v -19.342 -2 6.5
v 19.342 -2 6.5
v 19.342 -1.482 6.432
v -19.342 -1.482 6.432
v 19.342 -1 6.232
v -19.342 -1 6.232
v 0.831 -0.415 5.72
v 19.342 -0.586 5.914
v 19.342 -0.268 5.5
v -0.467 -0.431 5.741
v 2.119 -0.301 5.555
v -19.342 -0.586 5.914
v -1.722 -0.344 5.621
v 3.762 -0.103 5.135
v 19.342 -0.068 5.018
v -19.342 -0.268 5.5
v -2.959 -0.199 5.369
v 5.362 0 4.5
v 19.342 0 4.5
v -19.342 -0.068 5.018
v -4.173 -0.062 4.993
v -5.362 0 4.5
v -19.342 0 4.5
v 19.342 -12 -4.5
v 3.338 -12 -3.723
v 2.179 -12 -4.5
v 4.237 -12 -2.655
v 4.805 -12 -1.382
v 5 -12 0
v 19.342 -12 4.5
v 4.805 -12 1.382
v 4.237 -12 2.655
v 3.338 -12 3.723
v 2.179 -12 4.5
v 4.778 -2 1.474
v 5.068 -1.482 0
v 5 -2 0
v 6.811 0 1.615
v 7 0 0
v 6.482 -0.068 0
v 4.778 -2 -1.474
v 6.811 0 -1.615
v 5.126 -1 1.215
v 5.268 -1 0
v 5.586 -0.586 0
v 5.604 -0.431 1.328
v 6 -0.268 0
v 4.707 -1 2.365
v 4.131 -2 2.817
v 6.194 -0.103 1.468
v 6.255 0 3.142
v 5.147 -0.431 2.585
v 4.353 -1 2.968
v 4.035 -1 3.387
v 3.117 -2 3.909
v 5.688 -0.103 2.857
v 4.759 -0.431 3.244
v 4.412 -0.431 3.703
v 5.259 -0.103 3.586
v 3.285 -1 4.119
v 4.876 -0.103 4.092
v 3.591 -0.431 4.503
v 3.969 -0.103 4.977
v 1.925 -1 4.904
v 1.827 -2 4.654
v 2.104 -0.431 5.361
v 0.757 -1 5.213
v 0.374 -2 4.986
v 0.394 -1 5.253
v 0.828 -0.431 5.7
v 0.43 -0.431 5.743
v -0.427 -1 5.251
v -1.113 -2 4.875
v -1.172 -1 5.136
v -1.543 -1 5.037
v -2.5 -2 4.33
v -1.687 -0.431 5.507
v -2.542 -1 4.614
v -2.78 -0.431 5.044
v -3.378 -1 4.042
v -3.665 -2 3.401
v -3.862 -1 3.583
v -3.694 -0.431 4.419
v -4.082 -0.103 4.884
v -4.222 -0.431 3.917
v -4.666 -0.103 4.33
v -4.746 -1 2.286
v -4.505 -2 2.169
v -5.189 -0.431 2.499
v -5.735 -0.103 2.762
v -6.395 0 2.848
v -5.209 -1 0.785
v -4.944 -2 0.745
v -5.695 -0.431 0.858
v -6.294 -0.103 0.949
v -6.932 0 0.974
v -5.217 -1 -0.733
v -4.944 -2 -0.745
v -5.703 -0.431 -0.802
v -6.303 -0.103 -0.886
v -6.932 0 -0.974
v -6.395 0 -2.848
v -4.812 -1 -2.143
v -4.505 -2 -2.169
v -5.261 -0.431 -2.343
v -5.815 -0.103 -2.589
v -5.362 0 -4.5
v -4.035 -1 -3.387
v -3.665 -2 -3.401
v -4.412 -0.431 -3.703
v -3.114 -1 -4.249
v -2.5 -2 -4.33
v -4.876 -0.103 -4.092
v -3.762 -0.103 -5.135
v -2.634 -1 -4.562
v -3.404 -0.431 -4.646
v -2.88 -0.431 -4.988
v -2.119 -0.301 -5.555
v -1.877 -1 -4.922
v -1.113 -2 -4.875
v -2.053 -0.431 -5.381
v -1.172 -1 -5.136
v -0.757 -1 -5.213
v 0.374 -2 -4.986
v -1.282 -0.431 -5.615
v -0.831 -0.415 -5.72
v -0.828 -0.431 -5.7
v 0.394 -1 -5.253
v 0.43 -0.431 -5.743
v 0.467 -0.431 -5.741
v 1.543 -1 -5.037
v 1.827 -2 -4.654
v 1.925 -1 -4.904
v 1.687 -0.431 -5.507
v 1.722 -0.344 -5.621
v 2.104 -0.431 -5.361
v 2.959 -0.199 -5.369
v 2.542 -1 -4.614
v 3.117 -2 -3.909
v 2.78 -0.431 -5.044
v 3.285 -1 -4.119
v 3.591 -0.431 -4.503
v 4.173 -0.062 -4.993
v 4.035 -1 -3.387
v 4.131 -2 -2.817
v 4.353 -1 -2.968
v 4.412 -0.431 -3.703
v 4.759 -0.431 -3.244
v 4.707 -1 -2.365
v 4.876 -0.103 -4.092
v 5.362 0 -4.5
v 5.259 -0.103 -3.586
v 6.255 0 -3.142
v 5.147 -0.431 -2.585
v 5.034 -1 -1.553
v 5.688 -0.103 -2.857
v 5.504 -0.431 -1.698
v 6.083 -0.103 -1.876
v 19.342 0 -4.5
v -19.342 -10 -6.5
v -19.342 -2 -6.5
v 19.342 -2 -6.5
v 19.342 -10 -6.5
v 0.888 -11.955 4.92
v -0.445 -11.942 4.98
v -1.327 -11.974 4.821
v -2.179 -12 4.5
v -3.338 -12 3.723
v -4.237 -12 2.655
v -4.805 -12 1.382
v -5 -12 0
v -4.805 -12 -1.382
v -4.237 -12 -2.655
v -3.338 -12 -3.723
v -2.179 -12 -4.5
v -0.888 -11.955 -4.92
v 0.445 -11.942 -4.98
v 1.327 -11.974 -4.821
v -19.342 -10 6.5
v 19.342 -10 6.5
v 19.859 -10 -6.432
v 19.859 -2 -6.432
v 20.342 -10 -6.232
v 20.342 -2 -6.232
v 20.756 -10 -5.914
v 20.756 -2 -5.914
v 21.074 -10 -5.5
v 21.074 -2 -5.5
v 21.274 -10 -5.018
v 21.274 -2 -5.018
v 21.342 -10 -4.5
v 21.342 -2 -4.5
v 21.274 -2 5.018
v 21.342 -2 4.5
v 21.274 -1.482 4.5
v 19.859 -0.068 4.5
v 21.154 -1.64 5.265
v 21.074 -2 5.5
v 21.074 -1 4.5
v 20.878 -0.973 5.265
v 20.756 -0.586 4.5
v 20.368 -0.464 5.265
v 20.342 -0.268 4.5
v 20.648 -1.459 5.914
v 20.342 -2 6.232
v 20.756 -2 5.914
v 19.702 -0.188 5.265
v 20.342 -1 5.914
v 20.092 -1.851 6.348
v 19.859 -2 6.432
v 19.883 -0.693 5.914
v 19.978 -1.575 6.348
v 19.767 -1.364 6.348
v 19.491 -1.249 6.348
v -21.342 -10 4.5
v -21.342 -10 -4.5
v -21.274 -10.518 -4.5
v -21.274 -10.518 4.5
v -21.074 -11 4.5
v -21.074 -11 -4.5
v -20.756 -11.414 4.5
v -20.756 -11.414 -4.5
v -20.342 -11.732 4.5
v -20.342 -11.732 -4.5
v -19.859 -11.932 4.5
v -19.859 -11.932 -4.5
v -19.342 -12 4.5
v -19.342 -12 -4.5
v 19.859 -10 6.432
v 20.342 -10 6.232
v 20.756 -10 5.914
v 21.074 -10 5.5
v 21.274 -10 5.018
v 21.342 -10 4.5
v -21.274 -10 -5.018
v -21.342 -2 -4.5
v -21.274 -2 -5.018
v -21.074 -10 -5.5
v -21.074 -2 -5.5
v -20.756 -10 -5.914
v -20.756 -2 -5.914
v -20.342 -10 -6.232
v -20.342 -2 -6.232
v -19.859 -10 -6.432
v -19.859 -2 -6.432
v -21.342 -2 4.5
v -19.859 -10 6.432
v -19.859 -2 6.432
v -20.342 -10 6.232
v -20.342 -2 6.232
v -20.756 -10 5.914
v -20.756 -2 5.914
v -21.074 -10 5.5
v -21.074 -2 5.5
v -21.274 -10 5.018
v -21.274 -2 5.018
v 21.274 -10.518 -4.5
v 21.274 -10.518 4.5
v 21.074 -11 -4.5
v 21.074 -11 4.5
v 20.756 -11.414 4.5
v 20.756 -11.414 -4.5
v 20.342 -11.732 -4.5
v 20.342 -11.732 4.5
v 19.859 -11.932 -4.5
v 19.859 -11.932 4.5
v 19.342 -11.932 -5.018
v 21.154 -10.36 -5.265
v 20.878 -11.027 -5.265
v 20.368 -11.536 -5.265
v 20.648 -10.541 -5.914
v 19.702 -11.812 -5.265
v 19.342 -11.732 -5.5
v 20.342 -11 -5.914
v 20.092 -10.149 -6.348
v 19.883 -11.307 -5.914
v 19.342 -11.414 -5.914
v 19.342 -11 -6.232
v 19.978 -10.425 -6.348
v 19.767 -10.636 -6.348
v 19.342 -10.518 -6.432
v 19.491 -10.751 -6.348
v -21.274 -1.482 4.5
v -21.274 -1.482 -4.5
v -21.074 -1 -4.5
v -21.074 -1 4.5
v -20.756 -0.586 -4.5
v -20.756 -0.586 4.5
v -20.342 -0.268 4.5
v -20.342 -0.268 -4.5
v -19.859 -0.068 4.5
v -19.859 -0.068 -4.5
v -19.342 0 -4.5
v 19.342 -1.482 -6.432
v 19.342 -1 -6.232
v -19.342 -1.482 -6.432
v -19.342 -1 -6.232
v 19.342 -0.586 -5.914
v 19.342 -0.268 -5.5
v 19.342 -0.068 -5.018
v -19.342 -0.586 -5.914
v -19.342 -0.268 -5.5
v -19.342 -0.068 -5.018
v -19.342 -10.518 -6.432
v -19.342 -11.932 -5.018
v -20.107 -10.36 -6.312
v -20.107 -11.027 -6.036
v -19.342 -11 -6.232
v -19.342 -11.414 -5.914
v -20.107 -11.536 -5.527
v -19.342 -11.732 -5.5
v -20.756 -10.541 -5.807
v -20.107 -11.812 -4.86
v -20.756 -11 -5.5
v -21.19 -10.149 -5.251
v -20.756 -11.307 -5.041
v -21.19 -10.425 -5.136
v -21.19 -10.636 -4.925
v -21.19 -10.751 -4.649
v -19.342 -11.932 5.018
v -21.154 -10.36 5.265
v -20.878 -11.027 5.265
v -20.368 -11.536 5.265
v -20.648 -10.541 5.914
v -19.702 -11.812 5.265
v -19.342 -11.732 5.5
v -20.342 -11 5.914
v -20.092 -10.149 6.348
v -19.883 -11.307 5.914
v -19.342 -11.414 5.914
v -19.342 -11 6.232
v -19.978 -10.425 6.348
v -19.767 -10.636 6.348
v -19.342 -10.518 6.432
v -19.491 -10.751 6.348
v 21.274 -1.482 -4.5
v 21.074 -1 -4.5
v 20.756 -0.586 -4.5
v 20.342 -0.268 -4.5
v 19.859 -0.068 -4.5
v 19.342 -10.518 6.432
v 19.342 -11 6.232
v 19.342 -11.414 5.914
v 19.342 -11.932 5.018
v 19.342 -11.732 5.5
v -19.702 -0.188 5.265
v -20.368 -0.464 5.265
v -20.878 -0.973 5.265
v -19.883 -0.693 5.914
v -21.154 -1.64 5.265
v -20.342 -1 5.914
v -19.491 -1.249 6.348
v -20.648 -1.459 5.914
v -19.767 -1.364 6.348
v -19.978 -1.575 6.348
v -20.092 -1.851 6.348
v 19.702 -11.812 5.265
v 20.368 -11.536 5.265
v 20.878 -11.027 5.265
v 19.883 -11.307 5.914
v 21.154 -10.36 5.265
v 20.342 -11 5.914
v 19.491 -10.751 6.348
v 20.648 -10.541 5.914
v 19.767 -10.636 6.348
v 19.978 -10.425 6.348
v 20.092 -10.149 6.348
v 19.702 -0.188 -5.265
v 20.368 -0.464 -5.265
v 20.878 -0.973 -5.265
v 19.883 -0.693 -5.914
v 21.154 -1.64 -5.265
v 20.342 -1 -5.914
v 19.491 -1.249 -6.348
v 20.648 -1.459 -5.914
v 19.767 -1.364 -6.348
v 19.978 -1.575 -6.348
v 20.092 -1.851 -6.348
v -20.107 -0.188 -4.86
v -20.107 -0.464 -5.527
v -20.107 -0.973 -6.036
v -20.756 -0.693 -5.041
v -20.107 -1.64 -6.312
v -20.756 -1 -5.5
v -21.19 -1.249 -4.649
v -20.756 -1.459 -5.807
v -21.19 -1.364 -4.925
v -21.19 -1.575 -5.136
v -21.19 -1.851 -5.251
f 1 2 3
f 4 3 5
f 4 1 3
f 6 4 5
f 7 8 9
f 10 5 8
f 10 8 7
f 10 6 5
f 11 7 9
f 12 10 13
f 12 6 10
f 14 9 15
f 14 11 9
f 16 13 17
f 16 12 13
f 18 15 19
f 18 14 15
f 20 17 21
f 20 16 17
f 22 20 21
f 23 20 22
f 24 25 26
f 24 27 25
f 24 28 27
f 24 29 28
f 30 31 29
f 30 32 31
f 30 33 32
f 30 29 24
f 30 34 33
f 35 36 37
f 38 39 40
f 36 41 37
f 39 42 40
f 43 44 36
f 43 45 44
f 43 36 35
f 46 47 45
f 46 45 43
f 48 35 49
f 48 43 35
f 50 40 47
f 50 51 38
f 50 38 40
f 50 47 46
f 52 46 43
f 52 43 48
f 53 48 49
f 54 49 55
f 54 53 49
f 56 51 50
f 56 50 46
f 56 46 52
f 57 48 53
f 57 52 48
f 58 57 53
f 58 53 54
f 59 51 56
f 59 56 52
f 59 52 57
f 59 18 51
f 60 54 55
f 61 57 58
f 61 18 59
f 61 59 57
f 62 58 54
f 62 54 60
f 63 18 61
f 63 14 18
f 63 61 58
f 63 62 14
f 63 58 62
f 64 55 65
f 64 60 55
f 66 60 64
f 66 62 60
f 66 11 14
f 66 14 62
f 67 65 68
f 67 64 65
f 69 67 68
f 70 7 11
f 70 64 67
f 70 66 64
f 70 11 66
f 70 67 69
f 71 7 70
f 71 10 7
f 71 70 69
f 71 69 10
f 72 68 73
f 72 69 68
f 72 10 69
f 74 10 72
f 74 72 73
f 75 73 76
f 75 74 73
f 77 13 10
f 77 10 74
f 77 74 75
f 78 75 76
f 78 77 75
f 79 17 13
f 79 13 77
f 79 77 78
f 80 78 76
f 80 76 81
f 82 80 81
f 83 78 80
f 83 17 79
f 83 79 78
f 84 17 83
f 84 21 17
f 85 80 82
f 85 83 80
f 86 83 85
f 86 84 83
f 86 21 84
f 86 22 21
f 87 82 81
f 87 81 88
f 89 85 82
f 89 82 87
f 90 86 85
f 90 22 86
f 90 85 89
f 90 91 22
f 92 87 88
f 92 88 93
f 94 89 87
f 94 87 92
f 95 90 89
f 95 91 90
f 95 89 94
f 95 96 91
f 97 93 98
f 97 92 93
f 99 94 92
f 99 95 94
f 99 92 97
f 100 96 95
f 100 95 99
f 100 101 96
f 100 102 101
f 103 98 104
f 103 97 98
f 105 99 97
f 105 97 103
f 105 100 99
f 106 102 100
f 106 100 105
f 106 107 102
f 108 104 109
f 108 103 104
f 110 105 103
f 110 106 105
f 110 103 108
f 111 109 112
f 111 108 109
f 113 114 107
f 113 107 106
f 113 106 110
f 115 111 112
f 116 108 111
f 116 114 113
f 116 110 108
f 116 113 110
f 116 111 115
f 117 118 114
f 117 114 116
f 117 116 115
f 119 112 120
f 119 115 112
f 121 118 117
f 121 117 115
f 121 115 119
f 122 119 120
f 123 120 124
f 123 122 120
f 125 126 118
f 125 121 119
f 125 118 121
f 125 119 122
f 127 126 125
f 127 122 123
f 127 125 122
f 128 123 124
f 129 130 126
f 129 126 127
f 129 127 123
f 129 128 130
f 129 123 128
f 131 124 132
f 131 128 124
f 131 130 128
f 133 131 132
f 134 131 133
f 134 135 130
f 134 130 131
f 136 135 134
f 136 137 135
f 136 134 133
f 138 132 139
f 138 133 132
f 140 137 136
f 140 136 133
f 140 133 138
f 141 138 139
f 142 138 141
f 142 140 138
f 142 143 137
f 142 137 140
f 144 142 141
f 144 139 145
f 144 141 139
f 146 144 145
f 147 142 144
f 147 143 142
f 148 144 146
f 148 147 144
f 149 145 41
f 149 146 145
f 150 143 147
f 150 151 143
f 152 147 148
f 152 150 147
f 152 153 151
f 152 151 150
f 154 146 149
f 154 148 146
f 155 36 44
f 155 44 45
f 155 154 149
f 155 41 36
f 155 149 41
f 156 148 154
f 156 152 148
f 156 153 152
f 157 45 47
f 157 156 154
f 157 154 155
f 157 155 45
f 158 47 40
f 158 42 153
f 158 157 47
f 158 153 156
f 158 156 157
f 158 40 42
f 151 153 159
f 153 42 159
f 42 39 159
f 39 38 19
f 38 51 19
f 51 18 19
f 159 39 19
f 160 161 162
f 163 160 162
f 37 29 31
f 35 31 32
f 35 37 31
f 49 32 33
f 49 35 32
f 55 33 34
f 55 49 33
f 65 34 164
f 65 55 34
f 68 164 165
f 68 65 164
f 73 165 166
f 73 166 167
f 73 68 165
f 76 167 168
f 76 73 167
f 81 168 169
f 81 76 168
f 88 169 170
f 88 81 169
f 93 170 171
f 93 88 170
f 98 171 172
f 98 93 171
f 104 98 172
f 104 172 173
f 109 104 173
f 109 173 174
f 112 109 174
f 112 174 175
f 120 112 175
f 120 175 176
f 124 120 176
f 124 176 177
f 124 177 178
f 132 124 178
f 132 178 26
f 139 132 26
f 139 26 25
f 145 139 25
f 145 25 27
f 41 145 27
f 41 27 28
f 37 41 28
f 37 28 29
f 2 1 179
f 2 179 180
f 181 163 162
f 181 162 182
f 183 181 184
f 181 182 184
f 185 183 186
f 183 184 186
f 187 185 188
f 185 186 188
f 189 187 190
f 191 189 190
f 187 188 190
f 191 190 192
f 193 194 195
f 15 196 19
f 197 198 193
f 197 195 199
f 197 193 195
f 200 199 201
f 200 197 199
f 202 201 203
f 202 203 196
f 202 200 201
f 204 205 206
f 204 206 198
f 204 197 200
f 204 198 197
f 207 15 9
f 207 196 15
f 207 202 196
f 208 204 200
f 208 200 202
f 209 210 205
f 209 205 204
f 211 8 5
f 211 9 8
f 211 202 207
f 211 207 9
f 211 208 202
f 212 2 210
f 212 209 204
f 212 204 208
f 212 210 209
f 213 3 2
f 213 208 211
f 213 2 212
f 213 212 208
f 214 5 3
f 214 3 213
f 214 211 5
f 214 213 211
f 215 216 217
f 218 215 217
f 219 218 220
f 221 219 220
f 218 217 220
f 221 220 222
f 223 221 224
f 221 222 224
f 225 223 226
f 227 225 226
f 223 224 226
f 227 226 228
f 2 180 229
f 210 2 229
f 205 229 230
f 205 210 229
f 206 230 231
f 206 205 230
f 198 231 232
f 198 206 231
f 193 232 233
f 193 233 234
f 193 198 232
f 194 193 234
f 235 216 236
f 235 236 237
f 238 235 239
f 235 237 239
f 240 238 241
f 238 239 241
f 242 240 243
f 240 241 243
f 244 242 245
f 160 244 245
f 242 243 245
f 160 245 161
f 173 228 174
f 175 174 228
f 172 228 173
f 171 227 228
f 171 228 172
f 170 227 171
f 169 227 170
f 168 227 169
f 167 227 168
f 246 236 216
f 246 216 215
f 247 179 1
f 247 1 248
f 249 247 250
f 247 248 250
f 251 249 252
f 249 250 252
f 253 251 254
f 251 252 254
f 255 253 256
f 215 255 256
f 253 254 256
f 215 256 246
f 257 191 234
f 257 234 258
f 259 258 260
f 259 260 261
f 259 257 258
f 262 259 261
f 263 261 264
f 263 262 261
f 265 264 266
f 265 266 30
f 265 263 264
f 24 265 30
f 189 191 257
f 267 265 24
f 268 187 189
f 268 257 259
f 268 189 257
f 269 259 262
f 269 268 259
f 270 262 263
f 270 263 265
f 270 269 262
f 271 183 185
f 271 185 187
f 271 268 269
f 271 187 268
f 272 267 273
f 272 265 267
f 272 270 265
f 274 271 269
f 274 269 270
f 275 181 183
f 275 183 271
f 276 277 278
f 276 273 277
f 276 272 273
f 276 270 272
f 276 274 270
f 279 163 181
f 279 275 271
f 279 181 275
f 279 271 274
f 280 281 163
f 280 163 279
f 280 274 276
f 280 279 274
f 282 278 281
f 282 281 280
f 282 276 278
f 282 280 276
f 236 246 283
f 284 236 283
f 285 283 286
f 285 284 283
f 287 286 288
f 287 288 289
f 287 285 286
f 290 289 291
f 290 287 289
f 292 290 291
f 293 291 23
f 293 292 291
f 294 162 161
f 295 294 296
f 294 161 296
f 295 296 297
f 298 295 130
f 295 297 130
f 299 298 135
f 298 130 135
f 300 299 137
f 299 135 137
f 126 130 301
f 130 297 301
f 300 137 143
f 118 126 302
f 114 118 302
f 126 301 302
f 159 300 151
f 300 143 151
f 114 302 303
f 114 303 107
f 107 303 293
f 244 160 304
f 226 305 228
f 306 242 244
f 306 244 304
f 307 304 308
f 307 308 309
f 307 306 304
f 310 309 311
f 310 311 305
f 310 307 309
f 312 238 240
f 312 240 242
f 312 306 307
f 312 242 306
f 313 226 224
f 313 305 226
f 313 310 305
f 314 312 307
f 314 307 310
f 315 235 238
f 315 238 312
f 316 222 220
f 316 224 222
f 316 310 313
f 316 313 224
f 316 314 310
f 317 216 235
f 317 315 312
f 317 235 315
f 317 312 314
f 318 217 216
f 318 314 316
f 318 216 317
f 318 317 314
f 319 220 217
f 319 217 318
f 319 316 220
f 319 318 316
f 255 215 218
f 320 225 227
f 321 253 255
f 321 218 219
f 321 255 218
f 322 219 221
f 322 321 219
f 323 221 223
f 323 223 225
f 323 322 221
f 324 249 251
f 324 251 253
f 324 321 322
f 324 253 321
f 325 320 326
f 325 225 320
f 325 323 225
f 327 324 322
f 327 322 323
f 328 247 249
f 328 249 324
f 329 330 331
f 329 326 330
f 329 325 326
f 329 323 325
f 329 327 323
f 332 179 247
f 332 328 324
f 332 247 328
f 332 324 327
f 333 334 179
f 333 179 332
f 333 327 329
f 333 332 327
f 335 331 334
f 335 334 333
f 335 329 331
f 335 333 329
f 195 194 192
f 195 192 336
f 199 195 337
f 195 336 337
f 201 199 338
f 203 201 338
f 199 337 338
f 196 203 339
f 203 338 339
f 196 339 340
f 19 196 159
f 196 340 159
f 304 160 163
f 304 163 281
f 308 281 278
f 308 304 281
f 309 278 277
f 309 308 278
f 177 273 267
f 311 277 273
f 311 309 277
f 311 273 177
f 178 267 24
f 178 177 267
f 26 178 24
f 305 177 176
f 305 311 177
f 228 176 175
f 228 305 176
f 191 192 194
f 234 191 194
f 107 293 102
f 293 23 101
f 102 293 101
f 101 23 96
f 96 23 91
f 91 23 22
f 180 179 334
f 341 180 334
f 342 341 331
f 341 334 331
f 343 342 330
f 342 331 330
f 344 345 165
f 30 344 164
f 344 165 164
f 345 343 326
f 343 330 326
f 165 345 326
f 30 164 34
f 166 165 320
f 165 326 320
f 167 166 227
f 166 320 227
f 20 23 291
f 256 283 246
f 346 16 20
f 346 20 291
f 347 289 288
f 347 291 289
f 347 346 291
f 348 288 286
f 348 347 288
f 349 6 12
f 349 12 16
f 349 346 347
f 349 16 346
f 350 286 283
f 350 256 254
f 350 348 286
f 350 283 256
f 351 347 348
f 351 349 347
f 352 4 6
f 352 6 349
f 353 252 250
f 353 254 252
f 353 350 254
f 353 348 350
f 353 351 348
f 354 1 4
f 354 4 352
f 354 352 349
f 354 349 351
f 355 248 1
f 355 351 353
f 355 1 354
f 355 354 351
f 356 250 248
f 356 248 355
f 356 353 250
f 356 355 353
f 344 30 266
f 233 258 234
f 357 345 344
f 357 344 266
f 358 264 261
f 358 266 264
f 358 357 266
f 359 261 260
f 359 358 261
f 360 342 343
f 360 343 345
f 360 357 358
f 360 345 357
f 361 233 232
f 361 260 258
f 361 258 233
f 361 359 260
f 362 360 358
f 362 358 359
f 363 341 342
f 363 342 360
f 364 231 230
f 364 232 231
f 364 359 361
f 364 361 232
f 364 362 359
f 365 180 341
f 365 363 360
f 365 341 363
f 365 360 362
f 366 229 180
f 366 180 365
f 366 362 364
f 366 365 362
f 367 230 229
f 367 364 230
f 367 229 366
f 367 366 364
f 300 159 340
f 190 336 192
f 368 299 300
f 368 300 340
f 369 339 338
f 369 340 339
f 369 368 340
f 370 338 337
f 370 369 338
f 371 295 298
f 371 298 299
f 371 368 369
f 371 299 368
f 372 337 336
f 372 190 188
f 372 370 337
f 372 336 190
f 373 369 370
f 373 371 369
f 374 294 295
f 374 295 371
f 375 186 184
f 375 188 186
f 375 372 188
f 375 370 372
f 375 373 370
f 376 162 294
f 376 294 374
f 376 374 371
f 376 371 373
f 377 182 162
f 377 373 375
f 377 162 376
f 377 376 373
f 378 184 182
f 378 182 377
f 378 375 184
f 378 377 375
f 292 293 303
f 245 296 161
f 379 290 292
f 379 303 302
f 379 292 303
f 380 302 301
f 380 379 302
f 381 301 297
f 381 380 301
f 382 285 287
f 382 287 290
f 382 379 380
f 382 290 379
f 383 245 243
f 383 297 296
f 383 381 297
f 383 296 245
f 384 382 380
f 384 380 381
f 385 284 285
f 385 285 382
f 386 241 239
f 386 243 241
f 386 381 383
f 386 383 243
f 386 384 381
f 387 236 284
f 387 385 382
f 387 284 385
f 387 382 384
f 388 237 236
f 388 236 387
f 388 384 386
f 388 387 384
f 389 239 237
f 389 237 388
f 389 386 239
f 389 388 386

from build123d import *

# Parameters (mm, degrees)
F0_W         = 42.6834902611
F0_H         = 13
F0_R         = 5
F1_DEPTH     = 12
F2_T1_DEPTH  = 8
F2_T3_DEPTH  = 9
F2_T5_DEPTH  = 38.6834902611
F2_S9_W      = 2
F2_S9_H      = 2
F2_T10_DEPTH = 2
F2_S15_W     = 2
F2_S15_H     = 2
F2_T16_DEPTH = 2
F2_S21_W     = 2
F2_S21_H     = 2
F2_T22_DEPTH = 2
F2_S27_W     = 2
F2_S27_H     = 2
F2_T28_DEPTH = 2
F2_S33_W     = 2
F2_S33_H     = 2
F2_T34_DEPTH = 2
F2_S39_W     = 2
F2_S39_H     = 2
F2_T40_DEPTH = 2
F2_S45_W     = 2
F2_S45_H     = 2
F2_T46_DEPTH = 2
F2_S51_W     = 2
F2_S51_H     = 2
F2_T52_DEPTH = 2


# Not quite as in the source:
# - a fillet or chamfer that OpenCascade refuses, or shapes differently, is made with other operations: its cross-section is extruded or revolved along the edge and cut away or added


with BuildPart() as f1:
    # F0 (on Front) → F1 (new body)
    with BuildSketch(Plane.XZ):
        Rectangle(F0_W, F0_H)
        Circle(F0_R, mode=Mode.SUBTRACT)
    extrude(amount=F1_DEPTH)

    # F2: fillet of radius 2 on 13 edges, made by hand

    # F2_s2 → F2_t1 (cut)
    with BuildSketch(Plane.XZ.offset(2)):
        with BuildLine():
            ThreePointArc((-19.3417451306, 6.5), (-20.7559586929, 5.9142135624), (-21.3417451306, 4.5))
            Line((-21.3417451306, 4.5), (-21.3417451306, 6.5))
            Line((-21.3417451306, 6.5), (-19.3417451306, 6.5))
        make_face()
        with BuildLine():
            ThreePointArc((19.3417451306, 6.5), (20.7559586929, 5.9142135624), (21.3417451306, 4.5))
            Line((21.3417451306, 4.5), (21.3417451306, 6.5))
            Line((21.3417451306, 6.5), (19.3417451306, 6.5))
        make_face()
        with BuildLine():
            ThreePointArc((19.3417451306, -6.5), (20.7559586929, -5.9142135624), (21.3417451306, -4.5))
            Line((21.3417451306, -4.5), (21.3417451306, -6.5))
            Line((21.3417451306, -6.5), (19.3417451306, -6.5))
        make_face()
        with BuildLine():
            ThreePointArc((-21.3417451306, -4.5), (-20.7559586929, -5.9142135624), (-19.3417451306, -6.5))
            Line((-19.3417451306, -6.5), (-21.3417451306, -6.5))
            Line((-21.3417451306, -6.5), (-21.3417451306, -4.5))
        make_face()
    extrude(amount=F2_T1_DEPTH, mode=Mode.SUBTRACT)

    # F2_s4 → F2_t3 (cut)
    with BuildSketch(Plane.XY.offset(-4.5)):
        with BuildLine():
            ThreePointArc((21.3417451306, -10), (20.7559586929, -11.4142135624), (19.3417451306, -12))
            Line((19.3417451306, -12), (21.3417451306, -12))
            Line((21.3417451306, -12), (21.3417451306, -10))
        make_face()
        with BuildLine():
            ThreePointArc((21.3417451306, -2), (20.7559586929, -0.5857864376), (19.3417451306, 0))
            Line((19.3417451306, 0), (21.3417451306, 0))
            Line((21.3417451306, 0), (21.3417451306, -2))
        make_face()
        with BuildLine():
            ThreePointArc((-21.3417451306, -10), (-20.7559586929, -11.4142135624), (-19.3417451306, -12))
            Line((-19.3417451306, -12), (-21.3417451306, -12))
            Line((-21.3417451306, -12), (-21.3417451306, -10))
        make_face()
        with BuildLine():
            ThreePointArc((-21.3417451306, -2), (-20.7559586929, -0.5857864376), (-19.3417451306, 0))
            Line((-19.3417451306, 0), (-21.3417451306, 0))
            Line((-21.3417451306, 0), (-21.3417451306, -2))
        make_face()
    extrude(amount=F2_T3_DEPTH, mode=Mode.SUBTRACT)

    # F2_s6 → F2_t5 (cut)
    with BuildSketch(Plane.YZ.offset(-19.3417451306)):
        with BuildLine():
            ThreePointArc((-2, 6.5), (-0.5857864376, 5.9142135624), (0, 4.5))
            Line((0, 4.5), (0, 6.5))
            Line((0, 6.5), (-2, 6.5))
        make_face()
        with BuildLine():
            ThreePointArc((-10, 6.5), (-11.4142135624, 5.9142135624), (-12, 4.5))
            Line((-12, 4.5), (-12, 6.5))
            Line((-12, 6.5), (-10, 6.5))
        make_face()
        with BuildLine():
            ThreePointArc((-2, -6.5), (-0.5857864376, -5.9142135624), (0, -4.5))
            Line((0, -4.5), (0, -6.5))
            Line((0, -6.5), (-2, -6.5))
        make_face()
        with BuildLine():
            ThreePointArc((-10, -6.5), (-11.4142135624, -5.9142135624), (-12, -4.5))
            Line((-12, -4.5), (-12, -6.5))
            Line((-12, -6.5), (-10, -6.5))
        make_face()
    extrude(amount=F2_T5_DEPTH, mode=Mode.SUBTRACT)


with BuildPart() as f2_tool8:
    # F2_s9 → F2_t10 (new body)
    with BuildSketch(Plane.XY.offset(4.5)):
        with Locations((-20.3417451306, -1)):
            Rectangle(F2_S9_W, F2_S9_H)
    extrude(amount=F2_T10_DEPTH)

    # F2_s11 → F2_t12 (revolve, cut)
    with BuildSketch(Plane(origin=(-19.3417451306, -2, 4.5), x_dir=(0.7071067812, -0.7071067812, 0), z_dir=(-0.7071067812, -0.7071067812, 0))):
        with BuildLine():
            ThreePointArc((0, -2), (2, 0), (0, 2))
            Line((0, 2), (0, -2))
        make_face()
    revolve(axis=Axis((-19.3417451306, -2, 4.5), (0, 0, 1)), mode=Mode.SUBTRACT)


with BuildPart() as f1_1:
    add(f1.part)

    # F2_t7: cut F2_tool8
    add(f2_tool8.part, mode=Mode.SUBTRACT)


with BuildPart() as f2_tool14:
    # F2_s15 → F2_t16 (new body)
    with BuildSketch(Plane.XY.offset(4.5)):
        with Locations((-20.3417451306, -11)):
            Rectangle(F2_S15_W, F2_S15_H)
    extrude(amount=F2_T16_DEPTH)

    # F2_s17 → F2_t18 (revolve, cut)
    with BuildSketch(Plane(origin=(-19.3417451306, -10, 4.5), x_dir=(0.7071067812, 0.7071067812, 0), z_dir=(0.7071067812, -0.7071067812, 0))):
        with BuildLine():
            ThreePointArc((0, -2), (2, 0), (0, 2))
            Line((0, 2), (0, -2))
        make_face()
    revolve(axis=Axis((-19.3417451306, -10, 4.5), (0, 0, 1)), mode=Mode.SUBTRACT)


with BuildPart() as f1_2:
    add(f1_1.part)

    # F2_t13: cut F2_tool14
    add(f2_tool14.part, mode=Mode.SUBTRACT)


with BuildPart() as f2_tool20:
    # F2_s21 → F2_t22 (new body)
    with BuildSketch(Plane.XY.offset(4.5)):
        with Locations((20.3417451306, -1)):
            Rectangle(F2_S21_W, F2_S21_H)
    extrude(amount=F2_T22_DEPTH)

    # F2_s23 → F2_t24 (revolve, cut)
    with BuildSketch(Plane(origin=(19.3417451306, -2, 4.5), x_dir=(-0.7071067812, -0.7071067812, 0), z_dir=(-0.7071067812, 0.7071067812, 0))):
        with BuildLine():
            ThreePointArc((0, -2), (2, 0), (0, 2))
            Line((0, 2), (0, -2))
        make_face()
    revolve(axis=Axis((19.3417451306, -2, 4.5), (0, 0, 1)), mode=Mode.SUBTRACT)


with BuildPart() as f1_3:
    add(f1_2.part)

    # F2_t19: cut F2_tool20
    add(f2_tool20.part, mode=Mode.SUBTRACT)


with BuildPart() as f2_tool26:
    # F2_s27 → F2_t28 (new body)
    with BuildSketch(Plane.XY.offset(4.5)):
        with Locations((20.3417451306, -11)):
            Rectangle(F2_S27_W, F2_S27_H)
    extrude(amount=F2_T28_DEPTH)

    # F2_s29 → F2_t30 (revolve, cut)
    with BuildSketch(Plane(origin=(19.3417451306, -10, 4.5), x_dir=(-0.7071067812, 0.7071067812, 0), z_dir=(0.7071067812, 0.7071067812, 0))):
        with BuildLine():
            ThreePointArc((0, -2), (2, 0), (0, 2))
            Line((0, 2), (0, -2))
        make_face()
    revolve(axis=Axis((19.3417451306, -10, 4.5), (0, 0, 1)), mode=Mode.SUBTRACT)


with BuildPart() as f1_4:
    add(f1_3.part)

    # F2_t25: cut F2_tool26
    add(f2_tool26.part, mode=Mode.SUBTRACT)


with BuildPart() as f2_tool32:
    # F2_s33 → F2_t34 (new body)
    with BuildSketch(Plane.XY.offset(-4.5)):
        with Locations((20.3417451306, -1)):
            Rectangle(F2_S33_W, F2_S33_H)
    extrude(amount=-F2_T34_DEPTH)

    # F2_s35 → F2_t36 (revolve, cut)
    with BuildSketch(Plane(origin=(19.3417451306, -2, -4.5), x_dir=(-0.7071067812, -0.7071067812, 0), z_dir=(0.7071067812, -0.7071067812, 0))):
        with BuildLine():
            ThreePointArc((0, -2), (2, 0), (0, 2))
            Line((0, 2), (0, -2))
        make_face()
    revolve(axis=Axis((19.3417451306, -2, -4.5), (0, 0, -1)), mode=Mode.SUBTRACT)


with BuildPart() as f1_5:
    add(f1_4.part)

    # F2_t31: cut F2_tool32
    add(f2_tool32.part, mode=Mode.SUBTRACT)


with BuildPart() as f2_tool38:
    # F2_s39 → F2_t40 (new body)
    with BuildSketch(Plane.XY.offset(-4.5)):
        with Locations((20.3417451306, -11)):
            Rectangle(F2_S39_W, F2_S39_H)
    extrude(amount=-F2_T40_DEPTH)

    # F2_s41 → F2_t42 (revolve, cut)
    with BuildSketch(Plane(origin=(19.3417451306, -10, -4.5), x_dir=(-0.7071067812, 0.7071067812, 0), z_dir=(-0.7071067812, -0.7071067812, 0))):
        with BuildLine():
            ThreePointArc((0, -2), (2, 0), (0, 2))
            Line((0, 2), (0, -2))
        make_face()
    revolve(axis=Axis((19.3417451306, -10, -4.5), (0, 0, -1)), mode=Mode.SUBTRACT)


with BuildPart() as f1_6:
    add(f1_5.part)

    # F2_t37: cut F2_tool38
    add(f2_tool38.part, mode=Mode.SUBTRACT)


with BuildPart() as f2_tool44:
    # F2_s45 → F2_t46 (new body)
    with BuildSketch(Plane.YZ.offset(-19.3417451306)):
        with Locations((-11, -5.5)):
            Rectangle(F2_S45_W, F2_S45_H)
    extrude(amount=-F2_T46_DEPTH)

    # F2_s47 → F2_t48 (revolve, cut)
    with BuildSketch(Plane(origin=(-19.3417451306, -10, -4.5), x_dir=(0, 0.7071067812, 0.7071067812), z_dir=(0, -0.7071067812, 0.7071067812))):
        with BuildLine():
            ThreePointArc((0, -2), (2, 0), (0, 2))
            Line((0, 2), (0, -2))
        make_face()
    revolve(axis=Axis((-19.3417451306, -10, -4.5), (-1, 0, 0)), mode=Mode.SUBTRACT)


with BuildPart() as f1_7:
    add(f1_6.part)

    # F2_t43: cut F2_tool44
    add(f2_tool44.part, mode=Mode.SUBTRACT)


with BuildPart() as f2_tool50:
    # F2_s51 → F2_t52 (new body)
    with BuildSketch(Plane.YZ.offset(-19.3417451306)):
        with Locations((-1, -5.5)):
            Rectangle(F2_S51_W, F2_S51_H)
    extrude(amount=-F2_T52_DEPTH)

    # F2_s53 → F2_t54 (revolve, cut)
    with BuildSketch(Plane(origin=(-19.3417451306, -2, -4.5), x_dir=(0, -0.7071067812, 0.7071067812), z_dir=(0, -0.7071067812, -0.7071067812))):
        with BuildLine():
            ThreePointArc((0, -2), (2, 0), (0, 2))
            Line((0, 2), (0, -2))
        make_face()
    revolve(axis=Axis((-19.3417451306, -2, -4.5), (-1, 0, 0)), mode=Mode.SUBTRACT)


with BuildPart() as f1_8:
    add(f1_7.part)

    # F2_t49: cut F2_tool50
    add(f2_tool50.part, mode=Mode.SUBTRACT)

    # F2_s55 → F2_t56 (revolve, cut)
    with BuildSketch(Plane.XY):
        with BuildLine():
            ThreePointArc((5, -2), (5.5857864376, -0.5857864376), (7, 0))
            Line((7, 0), (5, 0))
            Line((5, 0), (5, -2))
        make_face()
    revolve(axis=Axis((0, 0, 0), (0, -1, 0)), mode=Mode.SUBTRACT)


solid = f1_8.part
